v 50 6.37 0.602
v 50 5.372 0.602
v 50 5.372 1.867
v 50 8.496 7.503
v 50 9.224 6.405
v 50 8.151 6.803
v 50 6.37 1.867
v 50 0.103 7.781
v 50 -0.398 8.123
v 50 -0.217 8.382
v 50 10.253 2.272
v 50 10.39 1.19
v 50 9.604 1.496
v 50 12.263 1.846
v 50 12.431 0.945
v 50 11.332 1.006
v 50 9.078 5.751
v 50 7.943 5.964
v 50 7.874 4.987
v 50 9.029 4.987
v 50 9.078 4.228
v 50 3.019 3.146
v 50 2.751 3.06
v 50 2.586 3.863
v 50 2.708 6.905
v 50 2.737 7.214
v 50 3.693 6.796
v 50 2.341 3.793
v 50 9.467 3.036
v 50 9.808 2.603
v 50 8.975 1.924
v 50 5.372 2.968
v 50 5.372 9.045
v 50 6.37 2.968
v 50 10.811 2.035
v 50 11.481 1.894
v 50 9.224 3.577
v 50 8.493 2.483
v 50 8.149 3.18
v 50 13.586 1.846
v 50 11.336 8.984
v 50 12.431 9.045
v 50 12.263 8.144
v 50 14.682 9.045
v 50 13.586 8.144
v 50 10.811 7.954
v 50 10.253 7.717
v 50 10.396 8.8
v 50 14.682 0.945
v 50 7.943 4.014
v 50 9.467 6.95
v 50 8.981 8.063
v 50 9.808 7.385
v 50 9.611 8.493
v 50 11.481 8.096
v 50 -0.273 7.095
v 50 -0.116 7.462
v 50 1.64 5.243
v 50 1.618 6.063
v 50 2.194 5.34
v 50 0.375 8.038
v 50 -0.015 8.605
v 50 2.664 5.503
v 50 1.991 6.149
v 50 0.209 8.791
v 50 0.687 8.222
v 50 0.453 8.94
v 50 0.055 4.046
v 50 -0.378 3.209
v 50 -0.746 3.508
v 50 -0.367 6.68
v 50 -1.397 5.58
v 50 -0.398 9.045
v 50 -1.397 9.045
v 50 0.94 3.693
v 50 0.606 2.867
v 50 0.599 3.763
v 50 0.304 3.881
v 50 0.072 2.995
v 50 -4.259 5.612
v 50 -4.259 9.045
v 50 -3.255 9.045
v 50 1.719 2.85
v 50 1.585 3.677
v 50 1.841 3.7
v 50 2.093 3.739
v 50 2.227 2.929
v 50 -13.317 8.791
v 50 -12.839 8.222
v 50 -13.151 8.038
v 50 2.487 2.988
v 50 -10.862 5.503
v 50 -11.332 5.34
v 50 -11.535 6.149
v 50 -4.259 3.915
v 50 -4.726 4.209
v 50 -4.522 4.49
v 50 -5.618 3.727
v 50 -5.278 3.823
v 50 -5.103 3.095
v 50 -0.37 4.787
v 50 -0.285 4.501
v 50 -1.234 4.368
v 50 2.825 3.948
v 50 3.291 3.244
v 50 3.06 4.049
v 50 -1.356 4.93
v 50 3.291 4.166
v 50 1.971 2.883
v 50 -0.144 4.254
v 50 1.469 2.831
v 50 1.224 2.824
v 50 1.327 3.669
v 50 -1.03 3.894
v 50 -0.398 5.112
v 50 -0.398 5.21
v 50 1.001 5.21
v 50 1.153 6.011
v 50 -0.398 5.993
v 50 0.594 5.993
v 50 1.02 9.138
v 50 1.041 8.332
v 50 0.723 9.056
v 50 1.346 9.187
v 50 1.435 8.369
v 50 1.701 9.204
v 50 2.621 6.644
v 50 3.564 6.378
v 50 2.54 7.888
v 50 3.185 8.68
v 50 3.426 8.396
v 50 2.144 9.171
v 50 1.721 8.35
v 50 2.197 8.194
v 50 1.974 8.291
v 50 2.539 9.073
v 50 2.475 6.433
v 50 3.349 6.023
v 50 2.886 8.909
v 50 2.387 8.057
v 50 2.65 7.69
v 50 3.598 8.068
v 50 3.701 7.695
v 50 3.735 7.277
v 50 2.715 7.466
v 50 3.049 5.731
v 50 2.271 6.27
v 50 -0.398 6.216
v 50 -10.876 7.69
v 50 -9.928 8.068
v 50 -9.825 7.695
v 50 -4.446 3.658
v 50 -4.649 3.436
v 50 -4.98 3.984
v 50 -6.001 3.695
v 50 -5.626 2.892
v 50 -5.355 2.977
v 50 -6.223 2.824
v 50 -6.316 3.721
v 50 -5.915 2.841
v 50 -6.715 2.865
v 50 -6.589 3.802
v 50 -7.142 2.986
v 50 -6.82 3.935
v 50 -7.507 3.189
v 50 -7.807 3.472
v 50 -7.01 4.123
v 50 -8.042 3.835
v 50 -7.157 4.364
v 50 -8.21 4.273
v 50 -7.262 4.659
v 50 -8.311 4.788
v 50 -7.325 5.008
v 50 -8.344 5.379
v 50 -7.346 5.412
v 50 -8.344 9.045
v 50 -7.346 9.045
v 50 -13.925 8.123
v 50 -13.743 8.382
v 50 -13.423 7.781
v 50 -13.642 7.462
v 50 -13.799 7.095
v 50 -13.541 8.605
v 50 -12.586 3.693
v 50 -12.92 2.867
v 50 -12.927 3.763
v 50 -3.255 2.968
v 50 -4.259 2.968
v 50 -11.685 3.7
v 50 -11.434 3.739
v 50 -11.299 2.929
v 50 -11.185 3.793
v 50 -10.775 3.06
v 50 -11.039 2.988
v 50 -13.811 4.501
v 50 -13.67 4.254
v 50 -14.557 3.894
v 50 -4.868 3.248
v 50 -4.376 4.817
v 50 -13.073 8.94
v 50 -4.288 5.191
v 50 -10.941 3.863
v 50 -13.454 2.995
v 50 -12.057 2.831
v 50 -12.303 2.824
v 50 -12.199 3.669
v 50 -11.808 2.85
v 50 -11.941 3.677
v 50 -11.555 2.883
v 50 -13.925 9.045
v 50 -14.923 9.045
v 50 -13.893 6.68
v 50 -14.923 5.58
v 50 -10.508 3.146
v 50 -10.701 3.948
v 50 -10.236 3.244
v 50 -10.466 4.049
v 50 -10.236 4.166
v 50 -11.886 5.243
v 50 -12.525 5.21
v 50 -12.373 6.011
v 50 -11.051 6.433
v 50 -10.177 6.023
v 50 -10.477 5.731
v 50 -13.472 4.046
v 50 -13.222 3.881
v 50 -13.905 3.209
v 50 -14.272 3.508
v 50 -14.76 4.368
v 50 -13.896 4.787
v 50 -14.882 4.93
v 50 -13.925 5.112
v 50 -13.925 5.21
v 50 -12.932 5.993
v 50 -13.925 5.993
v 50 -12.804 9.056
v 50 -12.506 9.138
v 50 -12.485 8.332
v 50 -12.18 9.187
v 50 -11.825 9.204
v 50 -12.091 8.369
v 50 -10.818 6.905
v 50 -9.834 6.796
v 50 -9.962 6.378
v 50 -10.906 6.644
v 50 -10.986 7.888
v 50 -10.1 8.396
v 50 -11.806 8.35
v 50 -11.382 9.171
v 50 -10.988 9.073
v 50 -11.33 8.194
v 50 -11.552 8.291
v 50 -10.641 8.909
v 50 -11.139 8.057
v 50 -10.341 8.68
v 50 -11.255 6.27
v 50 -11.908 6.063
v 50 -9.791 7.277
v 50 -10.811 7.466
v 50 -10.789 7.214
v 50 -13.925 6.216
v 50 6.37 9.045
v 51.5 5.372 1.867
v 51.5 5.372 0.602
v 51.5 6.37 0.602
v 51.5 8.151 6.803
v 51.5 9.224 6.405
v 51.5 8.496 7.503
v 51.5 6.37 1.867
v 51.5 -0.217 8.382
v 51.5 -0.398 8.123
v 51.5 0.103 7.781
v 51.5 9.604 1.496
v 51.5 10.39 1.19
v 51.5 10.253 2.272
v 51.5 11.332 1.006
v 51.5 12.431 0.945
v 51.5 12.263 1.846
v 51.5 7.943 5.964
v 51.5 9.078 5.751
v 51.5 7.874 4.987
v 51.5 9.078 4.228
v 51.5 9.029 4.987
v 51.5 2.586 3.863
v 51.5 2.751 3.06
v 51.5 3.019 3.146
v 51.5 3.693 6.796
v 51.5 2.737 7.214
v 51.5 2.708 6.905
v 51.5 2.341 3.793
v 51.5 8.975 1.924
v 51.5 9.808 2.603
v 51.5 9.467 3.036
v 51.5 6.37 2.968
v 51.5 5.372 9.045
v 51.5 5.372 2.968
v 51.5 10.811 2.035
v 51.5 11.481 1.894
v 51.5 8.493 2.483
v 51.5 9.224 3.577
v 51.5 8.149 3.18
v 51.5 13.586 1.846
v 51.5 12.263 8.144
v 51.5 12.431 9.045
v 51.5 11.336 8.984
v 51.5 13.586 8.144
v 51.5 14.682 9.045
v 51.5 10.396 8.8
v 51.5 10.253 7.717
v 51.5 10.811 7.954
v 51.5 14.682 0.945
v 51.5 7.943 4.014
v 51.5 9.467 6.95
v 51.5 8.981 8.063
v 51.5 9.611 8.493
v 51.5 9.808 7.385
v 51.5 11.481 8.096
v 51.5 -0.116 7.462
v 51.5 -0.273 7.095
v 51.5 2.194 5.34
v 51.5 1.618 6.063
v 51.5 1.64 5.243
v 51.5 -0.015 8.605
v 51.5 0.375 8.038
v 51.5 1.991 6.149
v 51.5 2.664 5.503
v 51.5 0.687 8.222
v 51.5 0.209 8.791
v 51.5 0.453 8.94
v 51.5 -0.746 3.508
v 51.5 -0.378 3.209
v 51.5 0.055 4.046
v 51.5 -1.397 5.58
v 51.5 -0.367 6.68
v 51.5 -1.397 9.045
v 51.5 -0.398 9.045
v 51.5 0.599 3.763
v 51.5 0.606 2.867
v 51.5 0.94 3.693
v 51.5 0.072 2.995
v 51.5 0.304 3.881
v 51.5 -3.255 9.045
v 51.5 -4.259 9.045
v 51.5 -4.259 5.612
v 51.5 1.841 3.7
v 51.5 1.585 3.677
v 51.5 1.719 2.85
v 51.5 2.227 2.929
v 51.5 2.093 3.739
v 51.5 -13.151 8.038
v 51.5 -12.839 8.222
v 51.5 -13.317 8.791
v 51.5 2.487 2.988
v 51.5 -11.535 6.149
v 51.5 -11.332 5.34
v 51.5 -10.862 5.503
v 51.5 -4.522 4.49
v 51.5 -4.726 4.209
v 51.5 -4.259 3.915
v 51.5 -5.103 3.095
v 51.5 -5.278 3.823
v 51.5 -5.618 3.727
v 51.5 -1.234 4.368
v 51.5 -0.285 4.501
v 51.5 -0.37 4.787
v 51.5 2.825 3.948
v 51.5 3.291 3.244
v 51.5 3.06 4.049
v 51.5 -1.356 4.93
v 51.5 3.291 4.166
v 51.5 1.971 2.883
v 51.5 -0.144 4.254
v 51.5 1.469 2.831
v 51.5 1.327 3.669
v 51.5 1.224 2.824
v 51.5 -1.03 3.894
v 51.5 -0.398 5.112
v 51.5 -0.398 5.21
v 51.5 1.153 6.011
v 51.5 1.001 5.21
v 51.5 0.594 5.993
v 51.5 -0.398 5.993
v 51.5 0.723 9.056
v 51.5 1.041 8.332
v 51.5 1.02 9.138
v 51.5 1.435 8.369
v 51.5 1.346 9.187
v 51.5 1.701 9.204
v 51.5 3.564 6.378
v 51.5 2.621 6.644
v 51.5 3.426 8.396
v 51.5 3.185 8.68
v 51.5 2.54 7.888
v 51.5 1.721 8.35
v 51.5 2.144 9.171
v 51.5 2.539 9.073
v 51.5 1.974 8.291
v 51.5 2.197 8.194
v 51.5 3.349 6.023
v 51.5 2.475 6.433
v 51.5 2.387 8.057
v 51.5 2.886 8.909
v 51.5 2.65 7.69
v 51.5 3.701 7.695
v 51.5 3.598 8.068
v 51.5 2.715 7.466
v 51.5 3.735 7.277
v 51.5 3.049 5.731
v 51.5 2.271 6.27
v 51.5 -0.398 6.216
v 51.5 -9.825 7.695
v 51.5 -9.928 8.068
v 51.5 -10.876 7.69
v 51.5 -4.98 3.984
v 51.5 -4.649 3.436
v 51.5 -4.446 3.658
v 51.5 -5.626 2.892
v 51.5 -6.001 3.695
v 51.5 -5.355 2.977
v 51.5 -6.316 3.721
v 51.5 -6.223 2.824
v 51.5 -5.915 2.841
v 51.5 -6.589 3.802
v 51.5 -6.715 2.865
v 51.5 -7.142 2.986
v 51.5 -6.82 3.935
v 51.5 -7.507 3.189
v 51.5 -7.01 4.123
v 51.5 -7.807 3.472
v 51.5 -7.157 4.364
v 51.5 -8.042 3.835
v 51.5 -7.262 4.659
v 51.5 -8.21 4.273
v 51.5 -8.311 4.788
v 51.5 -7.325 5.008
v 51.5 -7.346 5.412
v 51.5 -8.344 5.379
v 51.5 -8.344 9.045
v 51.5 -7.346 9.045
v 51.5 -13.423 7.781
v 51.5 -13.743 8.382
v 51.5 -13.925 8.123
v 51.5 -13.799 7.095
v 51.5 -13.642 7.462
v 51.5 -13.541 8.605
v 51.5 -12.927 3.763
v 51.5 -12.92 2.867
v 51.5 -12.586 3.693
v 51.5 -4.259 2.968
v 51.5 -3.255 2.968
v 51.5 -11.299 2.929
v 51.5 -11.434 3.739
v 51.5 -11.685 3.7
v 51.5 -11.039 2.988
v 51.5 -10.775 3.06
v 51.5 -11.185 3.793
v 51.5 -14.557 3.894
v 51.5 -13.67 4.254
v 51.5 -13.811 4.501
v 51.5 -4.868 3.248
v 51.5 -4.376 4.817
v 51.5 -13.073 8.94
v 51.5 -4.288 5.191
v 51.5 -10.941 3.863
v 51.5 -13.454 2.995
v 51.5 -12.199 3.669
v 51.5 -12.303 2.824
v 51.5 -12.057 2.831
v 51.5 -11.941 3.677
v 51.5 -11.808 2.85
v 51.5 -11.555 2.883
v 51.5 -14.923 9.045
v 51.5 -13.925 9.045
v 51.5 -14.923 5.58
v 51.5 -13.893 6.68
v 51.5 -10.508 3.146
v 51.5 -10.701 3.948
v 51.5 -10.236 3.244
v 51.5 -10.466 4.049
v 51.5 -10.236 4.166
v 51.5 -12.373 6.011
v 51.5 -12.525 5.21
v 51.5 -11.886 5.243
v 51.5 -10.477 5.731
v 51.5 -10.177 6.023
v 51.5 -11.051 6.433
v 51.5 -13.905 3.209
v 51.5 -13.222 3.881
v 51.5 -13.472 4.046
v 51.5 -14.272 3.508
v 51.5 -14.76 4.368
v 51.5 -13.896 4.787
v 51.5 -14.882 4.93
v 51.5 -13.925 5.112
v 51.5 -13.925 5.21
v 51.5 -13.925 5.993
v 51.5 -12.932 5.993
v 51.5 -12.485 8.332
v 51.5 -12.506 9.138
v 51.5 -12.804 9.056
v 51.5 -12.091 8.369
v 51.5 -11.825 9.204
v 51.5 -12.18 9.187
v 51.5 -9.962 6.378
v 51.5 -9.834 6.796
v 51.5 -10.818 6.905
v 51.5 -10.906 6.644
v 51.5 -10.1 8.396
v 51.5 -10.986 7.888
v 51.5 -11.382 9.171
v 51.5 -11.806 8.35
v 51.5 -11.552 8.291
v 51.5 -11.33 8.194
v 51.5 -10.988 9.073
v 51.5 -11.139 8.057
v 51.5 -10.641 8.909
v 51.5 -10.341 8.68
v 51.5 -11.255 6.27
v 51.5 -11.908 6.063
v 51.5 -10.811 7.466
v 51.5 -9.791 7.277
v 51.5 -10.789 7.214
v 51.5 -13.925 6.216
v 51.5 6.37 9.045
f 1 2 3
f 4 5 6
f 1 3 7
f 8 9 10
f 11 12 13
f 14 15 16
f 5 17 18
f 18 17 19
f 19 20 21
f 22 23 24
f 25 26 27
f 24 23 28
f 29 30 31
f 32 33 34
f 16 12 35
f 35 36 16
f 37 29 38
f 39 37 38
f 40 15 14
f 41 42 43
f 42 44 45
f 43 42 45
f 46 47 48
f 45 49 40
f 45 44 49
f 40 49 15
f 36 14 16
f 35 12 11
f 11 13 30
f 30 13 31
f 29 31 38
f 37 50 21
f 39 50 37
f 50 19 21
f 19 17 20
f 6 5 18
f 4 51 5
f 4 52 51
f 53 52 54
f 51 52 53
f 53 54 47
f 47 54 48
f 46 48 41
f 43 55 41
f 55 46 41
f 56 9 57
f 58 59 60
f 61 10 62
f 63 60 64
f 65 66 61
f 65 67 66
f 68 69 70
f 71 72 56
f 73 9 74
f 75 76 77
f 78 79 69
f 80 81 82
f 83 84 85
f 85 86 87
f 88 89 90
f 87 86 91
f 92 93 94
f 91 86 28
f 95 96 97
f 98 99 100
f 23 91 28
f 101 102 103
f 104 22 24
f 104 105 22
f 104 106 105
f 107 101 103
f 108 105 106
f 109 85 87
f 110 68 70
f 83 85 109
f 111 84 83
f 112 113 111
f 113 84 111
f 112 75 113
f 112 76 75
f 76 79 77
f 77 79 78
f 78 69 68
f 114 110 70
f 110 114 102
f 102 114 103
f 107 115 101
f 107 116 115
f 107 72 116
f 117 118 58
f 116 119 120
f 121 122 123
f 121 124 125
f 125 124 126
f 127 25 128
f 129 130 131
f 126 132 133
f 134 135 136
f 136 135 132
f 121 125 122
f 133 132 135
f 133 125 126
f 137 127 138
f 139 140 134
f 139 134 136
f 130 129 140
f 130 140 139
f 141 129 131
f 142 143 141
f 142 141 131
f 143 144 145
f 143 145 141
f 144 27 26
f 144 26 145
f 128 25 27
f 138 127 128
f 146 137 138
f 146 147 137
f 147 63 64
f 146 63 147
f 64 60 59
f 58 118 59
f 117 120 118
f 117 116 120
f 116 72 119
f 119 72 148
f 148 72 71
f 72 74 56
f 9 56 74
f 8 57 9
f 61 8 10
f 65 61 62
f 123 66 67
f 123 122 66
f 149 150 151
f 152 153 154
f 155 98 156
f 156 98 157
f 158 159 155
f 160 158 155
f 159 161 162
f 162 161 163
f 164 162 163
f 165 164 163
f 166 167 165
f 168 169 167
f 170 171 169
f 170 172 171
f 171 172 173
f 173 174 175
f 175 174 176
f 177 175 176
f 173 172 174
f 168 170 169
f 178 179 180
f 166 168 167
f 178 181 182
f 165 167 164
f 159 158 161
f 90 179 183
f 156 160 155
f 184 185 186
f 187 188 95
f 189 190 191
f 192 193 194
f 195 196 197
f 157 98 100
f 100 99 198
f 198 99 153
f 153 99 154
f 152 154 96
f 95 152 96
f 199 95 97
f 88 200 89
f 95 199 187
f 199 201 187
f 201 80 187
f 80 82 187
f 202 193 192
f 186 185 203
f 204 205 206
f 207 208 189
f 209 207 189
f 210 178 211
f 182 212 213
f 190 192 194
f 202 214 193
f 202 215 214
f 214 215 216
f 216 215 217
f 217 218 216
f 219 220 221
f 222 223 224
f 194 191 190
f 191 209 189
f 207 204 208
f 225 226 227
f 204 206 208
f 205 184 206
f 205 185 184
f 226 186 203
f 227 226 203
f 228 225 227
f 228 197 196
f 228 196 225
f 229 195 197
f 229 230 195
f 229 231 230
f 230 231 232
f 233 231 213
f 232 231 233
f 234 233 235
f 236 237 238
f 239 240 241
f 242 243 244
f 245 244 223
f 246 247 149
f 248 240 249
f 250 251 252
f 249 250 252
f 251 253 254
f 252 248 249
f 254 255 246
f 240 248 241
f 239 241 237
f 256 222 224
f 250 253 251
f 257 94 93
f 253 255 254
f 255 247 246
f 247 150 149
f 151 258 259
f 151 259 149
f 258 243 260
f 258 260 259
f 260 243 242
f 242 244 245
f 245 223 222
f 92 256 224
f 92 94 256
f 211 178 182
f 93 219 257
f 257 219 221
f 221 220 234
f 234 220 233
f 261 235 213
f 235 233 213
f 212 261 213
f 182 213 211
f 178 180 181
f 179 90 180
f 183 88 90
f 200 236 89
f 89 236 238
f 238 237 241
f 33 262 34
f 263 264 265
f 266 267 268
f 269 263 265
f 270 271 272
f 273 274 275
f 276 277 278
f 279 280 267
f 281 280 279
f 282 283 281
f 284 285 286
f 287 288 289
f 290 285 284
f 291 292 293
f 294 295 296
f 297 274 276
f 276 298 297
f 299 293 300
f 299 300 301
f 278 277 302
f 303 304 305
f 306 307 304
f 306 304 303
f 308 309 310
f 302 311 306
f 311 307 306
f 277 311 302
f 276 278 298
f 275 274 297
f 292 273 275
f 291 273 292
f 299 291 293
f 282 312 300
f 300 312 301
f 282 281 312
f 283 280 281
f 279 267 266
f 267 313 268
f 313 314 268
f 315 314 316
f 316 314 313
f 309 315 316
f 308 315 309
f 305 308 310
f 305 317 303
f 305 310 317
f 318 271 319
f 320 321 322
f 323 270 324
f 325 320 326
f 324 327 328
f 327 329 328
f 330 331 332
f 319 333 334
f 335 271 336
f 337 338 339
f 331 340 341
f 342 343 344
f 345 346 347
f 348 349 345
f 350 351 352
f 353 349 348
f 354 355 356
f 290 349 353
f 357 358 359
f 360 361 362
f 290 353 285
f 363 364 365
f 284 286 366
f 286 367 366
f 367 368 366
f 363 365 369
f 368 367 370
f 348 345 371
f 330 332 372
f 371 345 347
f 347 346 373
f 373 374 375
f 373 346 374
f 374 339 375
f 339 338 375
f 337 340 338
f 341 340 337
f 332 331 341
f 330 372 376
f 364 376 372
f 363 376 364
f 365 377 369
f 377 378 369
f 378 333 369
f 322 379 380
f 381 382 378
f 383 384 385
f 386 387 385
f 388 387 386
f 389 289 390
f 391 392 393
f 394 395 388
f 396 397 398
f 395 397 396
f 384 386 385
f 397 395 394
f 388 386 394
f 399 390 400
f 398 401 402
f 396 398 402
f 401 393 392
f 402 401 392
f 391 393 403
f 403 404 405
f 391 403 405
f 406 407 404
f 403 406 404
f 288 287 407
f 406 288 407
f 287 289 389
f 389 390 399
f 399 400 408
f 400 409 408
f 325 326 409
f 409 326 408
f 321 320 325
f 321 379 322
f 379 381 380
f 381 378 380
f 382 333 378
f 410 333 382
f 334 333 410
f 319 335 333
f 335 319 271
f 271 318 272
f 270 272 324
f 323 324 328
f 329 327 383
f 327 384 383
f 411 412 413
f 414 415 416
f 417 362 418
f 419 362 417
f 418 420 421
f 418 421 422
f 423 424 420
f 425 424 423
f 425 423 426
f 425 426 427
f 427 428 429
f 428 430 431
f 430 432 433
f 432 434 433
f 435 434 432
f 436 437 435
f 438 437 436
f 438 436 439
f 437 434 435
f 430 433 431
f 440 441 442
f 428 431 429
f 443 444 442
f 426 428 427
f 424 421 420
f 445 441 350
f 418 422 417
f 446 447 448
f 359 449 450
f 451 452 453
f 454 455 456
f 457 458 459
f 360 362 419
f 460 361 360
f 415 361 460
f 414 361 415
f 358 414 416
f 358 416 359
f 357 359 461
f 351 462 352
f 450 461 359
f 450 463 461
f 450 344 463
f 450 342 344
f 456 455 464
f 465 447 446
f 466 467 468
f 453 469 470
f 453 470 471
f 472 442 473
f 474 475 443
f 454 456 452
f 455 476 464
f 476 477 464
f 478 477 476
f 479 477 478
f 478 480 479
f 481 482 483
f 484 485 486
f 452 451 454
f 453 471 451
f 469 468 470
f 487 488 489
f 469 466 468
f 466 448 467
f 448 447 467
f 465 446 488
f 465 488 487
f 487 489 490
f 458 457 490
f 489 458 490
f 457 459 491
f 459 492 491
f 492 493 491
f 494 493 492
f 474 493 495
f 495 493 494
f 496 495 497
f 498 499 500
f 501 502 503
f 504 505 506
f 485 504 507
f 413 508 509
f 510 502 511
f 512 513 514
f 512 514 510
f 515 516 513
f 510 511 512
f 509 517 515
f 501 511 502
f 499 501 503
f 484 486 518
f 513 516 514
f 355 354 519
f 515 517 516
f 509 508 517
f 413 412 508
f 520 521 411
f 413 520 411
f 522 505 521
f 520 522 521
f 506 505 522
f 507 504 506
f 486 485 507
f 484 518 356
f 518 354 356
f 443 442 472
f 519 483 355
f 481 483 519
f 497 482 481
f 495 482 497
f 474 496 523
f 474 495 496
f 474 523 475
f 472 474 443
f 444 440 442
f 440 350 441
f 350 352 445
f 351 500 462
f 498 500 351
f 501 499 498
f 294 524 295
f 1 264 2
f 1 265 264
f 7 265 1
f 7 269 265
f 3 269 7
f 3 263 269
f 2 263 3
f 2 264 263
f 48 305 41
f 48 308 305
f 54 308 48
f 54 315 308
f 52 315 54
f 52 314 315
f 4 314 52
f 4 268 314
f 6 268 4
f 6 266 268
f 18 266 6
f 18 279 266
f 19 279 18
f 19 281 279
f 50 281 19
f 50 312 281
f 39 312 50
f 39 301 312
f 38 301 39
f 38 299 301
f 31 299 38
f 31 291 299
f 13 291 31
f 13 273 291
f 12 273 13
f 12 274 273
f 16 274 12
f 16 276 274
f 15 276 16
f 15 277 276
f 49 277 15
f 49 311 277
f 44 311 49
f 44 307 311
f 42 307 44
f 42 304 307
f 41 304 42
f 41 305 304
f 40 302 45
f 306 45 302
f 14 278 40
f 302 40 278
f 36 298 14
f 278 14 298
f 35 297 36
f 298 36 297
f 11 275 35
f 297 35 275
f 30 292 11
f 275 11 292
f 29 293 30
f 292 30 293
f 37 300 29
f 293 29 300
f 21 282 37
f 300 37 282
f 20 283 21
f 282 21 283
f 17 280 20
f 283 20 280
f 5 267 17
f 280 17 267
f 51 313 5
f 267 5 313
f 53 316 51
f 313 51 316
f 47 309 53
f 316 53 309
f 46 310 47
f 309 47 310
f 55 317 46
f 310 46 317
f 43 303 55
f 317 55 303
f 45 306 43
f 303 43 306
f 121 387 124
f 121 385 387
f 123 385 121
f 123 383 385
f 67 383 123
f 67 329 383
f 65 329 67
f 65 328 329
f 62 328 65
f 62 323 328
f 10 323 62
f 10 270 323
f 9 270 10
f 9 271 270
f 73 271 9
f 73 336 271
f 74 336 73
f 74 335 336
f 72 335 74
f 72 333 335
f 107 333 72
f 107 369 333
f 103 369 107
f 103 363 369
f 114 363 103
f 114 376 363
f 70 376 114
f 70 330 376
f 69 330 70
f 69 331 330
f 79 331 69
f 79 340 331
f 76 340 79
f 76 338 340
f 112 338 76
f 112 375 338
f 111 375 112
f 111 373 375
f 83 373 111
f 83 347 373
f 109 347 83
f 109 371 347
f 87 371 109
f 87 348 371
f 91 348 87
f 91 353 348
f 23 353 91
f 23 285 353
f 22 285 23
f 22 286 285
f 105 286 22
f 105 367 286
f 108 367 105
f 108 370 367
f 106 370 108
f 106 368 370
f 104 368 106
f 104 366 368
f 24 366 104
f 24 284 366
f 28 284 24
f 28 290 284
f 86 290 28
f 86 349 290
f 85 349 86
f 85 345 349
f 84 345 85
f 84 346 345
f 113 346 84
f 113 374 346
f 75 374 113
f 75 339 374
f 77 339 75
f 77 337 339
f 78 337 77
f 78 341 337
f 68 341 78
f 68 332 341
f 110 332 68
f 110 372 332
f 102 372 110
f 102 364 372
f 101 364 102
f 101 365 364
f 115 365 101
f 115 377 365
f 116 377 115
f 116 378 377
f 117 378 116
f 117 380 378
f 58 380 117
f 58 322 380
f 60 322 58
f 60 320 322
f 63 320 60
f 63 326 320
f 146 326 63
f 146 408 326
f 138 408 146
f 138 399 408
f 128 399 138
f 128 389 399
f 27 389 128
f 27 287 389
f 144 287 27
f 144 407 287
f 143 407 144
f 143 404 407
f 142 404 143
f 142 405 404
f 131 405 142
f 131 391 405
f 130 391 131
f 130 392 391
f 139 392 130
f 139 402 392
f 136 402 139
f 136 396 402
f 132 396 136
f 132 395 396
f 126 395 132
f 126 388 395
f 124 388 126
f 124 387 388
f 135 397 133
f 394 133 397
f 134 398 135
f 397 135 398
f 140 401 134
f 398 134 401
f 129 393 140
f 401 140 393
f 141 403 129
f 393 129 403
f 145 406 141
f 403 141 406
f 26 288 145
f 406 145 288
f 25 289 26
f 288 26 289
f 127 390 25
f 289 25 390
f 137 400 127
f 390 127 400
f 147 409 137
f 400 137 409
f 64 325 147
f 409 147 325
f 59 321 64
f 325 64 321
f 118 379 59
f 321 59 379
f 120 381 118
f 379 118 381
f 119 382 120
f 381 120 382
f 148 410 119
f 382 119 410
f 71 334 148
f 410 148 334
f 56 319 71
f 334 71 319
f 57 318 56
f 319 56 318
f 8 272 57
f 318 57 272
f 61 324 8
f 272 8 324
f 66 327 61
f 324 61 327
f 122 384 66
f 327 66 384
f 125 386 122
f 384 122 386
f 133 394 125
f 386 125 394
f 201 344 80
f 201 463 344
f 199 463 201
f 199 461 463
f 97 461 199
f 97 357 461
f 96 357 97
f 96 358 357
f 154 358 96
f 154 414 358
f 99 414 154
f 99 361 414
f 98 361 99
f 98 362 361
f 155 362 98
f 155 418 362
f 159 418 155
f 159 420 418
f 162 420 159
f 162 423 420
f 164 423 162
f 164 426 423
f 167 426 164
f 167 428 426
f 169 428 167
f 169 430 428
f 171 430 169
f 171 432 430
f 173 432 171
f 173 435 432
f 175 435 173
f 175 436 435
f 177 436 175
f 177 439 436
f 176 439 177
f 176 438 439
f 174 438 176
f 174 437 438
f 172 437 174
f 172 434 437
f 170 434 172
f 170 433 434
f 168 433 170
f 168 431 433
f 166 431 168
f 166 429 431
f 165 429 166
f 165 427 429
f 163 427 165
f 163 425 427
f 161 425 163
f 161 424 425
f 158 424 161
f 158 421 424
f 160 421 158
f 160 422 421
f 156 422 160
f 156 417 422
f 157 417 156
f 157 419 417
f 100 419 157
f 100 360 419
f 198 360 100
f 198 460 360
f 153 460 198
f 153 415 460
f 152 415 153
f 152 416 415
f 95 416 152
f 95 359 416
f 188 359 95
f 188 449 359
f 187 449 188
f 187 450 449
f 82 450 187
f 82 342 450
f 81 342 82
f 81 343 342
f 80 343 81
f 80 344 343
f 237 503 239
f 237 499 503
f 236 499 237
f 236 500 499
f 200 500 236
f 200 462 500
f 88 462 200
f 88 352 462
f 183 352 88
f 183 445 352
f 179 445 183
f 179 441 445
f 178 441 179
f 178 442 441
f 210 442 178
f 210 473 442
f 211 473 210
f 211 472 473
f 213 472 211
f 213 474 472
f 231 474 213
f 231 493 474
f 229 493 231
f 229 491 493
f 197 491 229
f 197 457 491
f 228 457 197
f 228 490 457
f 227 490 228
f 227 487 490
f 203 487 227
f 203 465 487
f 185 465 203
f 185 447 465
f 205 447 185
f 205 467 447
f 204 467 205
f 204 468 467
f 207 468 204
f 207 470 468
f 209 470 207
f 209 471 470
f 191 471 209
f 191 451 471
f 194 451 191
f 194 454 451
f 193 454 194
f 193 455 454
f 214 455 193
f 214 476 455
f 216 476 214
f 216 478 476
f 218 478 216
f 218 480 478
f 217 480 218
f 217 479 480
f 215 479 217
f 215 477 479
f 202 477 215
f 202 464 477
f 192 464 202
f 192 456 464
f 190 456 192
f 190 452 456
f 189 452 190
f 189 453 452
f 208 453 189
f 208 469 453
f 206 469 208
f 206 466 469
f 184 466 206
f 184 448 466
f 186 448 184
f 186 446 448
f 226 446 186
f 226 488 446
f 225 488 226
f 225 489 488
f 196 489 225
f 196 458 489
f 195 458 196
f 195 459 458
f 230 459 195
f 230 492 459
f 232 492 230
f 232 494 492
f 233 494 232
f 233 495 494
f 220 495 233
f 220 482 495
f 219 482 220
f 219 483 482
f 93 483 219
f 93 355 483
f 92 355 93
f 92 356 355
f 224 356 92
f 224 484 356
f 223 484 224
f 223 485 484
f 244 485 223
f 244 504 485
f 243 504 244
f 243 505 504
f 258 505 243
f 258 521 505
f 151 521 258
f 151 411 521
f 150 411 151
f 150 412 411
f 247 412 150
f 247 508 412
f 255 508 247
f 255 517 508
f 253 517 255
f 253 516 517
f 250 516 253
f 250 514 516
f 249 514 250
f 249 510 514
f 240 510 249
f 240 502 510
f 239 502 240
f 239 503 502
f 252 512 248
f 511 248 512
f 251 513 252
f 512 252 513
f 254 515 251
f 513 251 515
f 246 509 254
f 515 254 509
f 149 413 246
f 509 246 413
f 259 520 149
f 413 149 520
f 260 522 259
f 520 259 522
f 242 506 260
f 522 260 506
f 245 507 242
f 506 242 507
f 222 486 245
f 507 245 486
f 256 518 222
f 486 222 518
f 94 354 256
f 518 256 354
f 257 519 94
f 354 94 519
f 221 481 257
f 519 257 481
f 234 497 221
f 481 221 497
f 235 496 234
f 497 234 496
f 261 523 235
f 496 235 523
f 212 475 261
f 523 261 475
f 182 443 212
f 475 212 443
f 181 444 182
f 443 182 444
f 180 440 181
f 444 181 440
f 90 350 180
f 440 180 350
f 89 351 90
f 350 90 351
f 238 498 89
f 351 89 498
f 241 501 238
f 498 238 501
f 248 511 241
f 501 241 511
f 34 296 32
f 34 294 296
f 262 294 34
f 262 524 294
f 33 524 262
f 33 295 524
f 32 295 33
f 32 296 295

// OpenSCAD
// file: bitbeam-beam.scad
// Description: "LEGO Technic-compatible gridbeam"
// Project home: http://bitbeam.org

// Each bitbeam is 8mm inches wide. 
// Center of each hole is 8mm apart from each other
// Holes are 5.1 mm in diameter.

// Mini
//beam_width     = 4;
//hole_diameter  = 2.2;

// Standard
beam_width     = 8;
hole_diameter  = 5.1;

hole_radius    = hole_diameter / 2;

module beam(number_of_holes) {
    beam_length = number_of_holes * beam_width;
    difference() {
        // Draw the beam...
        cube([beam_length,beam_width,beam_width]);
    
        // Cut the holes...
        for (x=[beam_width/2 : beam_width : beam_length]) {
            translate([x,beam_width/2,-2])
            cylinder(r=hole_radius, h=12, $fn=30);
        }
        for (x=[beam_width/2 : beam_width : beam_length]) {
            rotate([90,0,0])
            translate([x,beam_width/2,-10])
            cylinder(r=hole_radius, h=12, $fn=30);
        }

        // Optional through-hole
        //rotate([0,90,0])
        //translate([-4,beam_width/2,-2])
        //cylinder(r=hole_radius, h=number_of_holes*beam_width+4, $fn=30);
        }
}

//beam(3);
// file: constants.scad
//-------------------------------------------------------------
//-- Futaba Horn from Servo wheel by Juan Gonzalez (obijuan) juan@iearobotics.com
//-------------------------------------------------------------

//-- Wheel parameters
wheel_or_idiam = 50;                   //-- O-ring inner diameter
wheel_or_diam = 1;                     //-- O-ring section diameter
wheel_height = 2*wheel_or_diam+0;     //-- Wheel height: change the 0 for 
                                      //-- other value (0 equals minimun height)
//-- Parameters common to all horns
horn_drill_diam = 2;
horn_height = 8;        //-- Total height: shaft + plate
horn_plate_height = 2;  //-- plate height

//-- Futaba 3003 servo rounded horn parameters
rh_diam1 = 8.5;  //-- Rounded horn small diameter
rh_diam2 = 24; //-- Rounded horn big diameter
rounded_horn_drill_distance = 7.3;

//-- Futaba 3003 4-arm horn parameters
a4h_end_diam = 5;
a4h_center_diam = 10;
a4h_arm_length = 15;
a4h_drill_distance = 13.3;

//-- Pill parameters
pill_diam = 16;
pill_height = 8;
pill_holder = pill_diam * 1.5;

length = 70;


module motorPeg(height=12.5) {
    difference() {
        cube([7, 18, height], center=true);
        translate([0, -5, 0])
            cylinder(r=1, h=20, center=true, $fn=100);
        translate([0, 5, 0])
            cylinder(r=1, h=20, center=true, $fn=100);
    }
}

module gato() {
    scale(3)
        rotate([180, 0, -90])
            difference() {
                import("calicat.stl", convexity=3);
                translate([0, 8, 0])
                    cube([50, 50, 50]);
            }
}
// main file
include <constants.scad>;
include <bitbeam-beam.scad>;

module leg() {
    union() {
        cube([3.5, 8*2, 8]);
        translate([3.5, 0, 0])
            beam(5);            
        translate([3.5, 8, 0])
            beam(5);
    }
}

module wheel4() {
//	difference() {
//        union() {
//            cylinder(r=45, h=1, center=true);
//            translate([0, 0, 4.5/2])
//                cylinder(r=16/2, h=4.5, center=true);
//            
//            translate([-35, 0, 7])
//                motorPeg();
//            
//            translate([14, 0, 7])
//                motorPeg();
//            
////            translate([8*4, -8*2, 0])
////                rotate([90, 270, 0])
////                    leg();
////            
////            translate([8*4, 8*3, 0])
////                rotate([90, 270, 0])
////                    leg();
//        }
//		for (i = [0 : 0]) {
//			translate([0, 0, 0])
//			rotate([0,0,i*36])
//				translate([0, 33, -1])
//					cylinder(h=3, r=pill_diam / 2);
//		}
//		translate([0, 0, -1])
//			cylinder(r=13.5/2, h=10);  
//	}
//    
//    translate([57, 57, 43])
//        difference() {
//            gato();
//            translate([0, -50, -83.5])
//                cube([50, 100, 80], center=true);
//            translate([0, -60, -2])
//                cube([6, 70, 10], center=true);
//            
//            translate([-5, -57, -22])
//                rotate([90, 0, 90])
//                    union() {
//                        cube([37, 21, 8], center=true);
//                        translate([-26, 0, 1])
//                            cube([15, 12, 11], center=true);
//                        translate([0, 9, -10])
//                            cube([29, 1, 20], center=true);
//                        translate([0, -9, -10])
//                            cube([29, 1, 20], center=true);
//                        translate([0, 0, -18])
//                            cube([37, 21, 23], center=true);
//                    }
//        }
    // TODO: Signature
    translate([50, 0, 5])
        rotate([90, 0, 90])
            difference() {
//                cube([30, 8, 3], center=true);
                rotate([0, 0, 180])
                linear_extrude(1.5)
                    text("Diana", font="SignPainter:style=HouseScript Semibold", size=8,  halign="center", valign="center");
            }
}

wheel4();
